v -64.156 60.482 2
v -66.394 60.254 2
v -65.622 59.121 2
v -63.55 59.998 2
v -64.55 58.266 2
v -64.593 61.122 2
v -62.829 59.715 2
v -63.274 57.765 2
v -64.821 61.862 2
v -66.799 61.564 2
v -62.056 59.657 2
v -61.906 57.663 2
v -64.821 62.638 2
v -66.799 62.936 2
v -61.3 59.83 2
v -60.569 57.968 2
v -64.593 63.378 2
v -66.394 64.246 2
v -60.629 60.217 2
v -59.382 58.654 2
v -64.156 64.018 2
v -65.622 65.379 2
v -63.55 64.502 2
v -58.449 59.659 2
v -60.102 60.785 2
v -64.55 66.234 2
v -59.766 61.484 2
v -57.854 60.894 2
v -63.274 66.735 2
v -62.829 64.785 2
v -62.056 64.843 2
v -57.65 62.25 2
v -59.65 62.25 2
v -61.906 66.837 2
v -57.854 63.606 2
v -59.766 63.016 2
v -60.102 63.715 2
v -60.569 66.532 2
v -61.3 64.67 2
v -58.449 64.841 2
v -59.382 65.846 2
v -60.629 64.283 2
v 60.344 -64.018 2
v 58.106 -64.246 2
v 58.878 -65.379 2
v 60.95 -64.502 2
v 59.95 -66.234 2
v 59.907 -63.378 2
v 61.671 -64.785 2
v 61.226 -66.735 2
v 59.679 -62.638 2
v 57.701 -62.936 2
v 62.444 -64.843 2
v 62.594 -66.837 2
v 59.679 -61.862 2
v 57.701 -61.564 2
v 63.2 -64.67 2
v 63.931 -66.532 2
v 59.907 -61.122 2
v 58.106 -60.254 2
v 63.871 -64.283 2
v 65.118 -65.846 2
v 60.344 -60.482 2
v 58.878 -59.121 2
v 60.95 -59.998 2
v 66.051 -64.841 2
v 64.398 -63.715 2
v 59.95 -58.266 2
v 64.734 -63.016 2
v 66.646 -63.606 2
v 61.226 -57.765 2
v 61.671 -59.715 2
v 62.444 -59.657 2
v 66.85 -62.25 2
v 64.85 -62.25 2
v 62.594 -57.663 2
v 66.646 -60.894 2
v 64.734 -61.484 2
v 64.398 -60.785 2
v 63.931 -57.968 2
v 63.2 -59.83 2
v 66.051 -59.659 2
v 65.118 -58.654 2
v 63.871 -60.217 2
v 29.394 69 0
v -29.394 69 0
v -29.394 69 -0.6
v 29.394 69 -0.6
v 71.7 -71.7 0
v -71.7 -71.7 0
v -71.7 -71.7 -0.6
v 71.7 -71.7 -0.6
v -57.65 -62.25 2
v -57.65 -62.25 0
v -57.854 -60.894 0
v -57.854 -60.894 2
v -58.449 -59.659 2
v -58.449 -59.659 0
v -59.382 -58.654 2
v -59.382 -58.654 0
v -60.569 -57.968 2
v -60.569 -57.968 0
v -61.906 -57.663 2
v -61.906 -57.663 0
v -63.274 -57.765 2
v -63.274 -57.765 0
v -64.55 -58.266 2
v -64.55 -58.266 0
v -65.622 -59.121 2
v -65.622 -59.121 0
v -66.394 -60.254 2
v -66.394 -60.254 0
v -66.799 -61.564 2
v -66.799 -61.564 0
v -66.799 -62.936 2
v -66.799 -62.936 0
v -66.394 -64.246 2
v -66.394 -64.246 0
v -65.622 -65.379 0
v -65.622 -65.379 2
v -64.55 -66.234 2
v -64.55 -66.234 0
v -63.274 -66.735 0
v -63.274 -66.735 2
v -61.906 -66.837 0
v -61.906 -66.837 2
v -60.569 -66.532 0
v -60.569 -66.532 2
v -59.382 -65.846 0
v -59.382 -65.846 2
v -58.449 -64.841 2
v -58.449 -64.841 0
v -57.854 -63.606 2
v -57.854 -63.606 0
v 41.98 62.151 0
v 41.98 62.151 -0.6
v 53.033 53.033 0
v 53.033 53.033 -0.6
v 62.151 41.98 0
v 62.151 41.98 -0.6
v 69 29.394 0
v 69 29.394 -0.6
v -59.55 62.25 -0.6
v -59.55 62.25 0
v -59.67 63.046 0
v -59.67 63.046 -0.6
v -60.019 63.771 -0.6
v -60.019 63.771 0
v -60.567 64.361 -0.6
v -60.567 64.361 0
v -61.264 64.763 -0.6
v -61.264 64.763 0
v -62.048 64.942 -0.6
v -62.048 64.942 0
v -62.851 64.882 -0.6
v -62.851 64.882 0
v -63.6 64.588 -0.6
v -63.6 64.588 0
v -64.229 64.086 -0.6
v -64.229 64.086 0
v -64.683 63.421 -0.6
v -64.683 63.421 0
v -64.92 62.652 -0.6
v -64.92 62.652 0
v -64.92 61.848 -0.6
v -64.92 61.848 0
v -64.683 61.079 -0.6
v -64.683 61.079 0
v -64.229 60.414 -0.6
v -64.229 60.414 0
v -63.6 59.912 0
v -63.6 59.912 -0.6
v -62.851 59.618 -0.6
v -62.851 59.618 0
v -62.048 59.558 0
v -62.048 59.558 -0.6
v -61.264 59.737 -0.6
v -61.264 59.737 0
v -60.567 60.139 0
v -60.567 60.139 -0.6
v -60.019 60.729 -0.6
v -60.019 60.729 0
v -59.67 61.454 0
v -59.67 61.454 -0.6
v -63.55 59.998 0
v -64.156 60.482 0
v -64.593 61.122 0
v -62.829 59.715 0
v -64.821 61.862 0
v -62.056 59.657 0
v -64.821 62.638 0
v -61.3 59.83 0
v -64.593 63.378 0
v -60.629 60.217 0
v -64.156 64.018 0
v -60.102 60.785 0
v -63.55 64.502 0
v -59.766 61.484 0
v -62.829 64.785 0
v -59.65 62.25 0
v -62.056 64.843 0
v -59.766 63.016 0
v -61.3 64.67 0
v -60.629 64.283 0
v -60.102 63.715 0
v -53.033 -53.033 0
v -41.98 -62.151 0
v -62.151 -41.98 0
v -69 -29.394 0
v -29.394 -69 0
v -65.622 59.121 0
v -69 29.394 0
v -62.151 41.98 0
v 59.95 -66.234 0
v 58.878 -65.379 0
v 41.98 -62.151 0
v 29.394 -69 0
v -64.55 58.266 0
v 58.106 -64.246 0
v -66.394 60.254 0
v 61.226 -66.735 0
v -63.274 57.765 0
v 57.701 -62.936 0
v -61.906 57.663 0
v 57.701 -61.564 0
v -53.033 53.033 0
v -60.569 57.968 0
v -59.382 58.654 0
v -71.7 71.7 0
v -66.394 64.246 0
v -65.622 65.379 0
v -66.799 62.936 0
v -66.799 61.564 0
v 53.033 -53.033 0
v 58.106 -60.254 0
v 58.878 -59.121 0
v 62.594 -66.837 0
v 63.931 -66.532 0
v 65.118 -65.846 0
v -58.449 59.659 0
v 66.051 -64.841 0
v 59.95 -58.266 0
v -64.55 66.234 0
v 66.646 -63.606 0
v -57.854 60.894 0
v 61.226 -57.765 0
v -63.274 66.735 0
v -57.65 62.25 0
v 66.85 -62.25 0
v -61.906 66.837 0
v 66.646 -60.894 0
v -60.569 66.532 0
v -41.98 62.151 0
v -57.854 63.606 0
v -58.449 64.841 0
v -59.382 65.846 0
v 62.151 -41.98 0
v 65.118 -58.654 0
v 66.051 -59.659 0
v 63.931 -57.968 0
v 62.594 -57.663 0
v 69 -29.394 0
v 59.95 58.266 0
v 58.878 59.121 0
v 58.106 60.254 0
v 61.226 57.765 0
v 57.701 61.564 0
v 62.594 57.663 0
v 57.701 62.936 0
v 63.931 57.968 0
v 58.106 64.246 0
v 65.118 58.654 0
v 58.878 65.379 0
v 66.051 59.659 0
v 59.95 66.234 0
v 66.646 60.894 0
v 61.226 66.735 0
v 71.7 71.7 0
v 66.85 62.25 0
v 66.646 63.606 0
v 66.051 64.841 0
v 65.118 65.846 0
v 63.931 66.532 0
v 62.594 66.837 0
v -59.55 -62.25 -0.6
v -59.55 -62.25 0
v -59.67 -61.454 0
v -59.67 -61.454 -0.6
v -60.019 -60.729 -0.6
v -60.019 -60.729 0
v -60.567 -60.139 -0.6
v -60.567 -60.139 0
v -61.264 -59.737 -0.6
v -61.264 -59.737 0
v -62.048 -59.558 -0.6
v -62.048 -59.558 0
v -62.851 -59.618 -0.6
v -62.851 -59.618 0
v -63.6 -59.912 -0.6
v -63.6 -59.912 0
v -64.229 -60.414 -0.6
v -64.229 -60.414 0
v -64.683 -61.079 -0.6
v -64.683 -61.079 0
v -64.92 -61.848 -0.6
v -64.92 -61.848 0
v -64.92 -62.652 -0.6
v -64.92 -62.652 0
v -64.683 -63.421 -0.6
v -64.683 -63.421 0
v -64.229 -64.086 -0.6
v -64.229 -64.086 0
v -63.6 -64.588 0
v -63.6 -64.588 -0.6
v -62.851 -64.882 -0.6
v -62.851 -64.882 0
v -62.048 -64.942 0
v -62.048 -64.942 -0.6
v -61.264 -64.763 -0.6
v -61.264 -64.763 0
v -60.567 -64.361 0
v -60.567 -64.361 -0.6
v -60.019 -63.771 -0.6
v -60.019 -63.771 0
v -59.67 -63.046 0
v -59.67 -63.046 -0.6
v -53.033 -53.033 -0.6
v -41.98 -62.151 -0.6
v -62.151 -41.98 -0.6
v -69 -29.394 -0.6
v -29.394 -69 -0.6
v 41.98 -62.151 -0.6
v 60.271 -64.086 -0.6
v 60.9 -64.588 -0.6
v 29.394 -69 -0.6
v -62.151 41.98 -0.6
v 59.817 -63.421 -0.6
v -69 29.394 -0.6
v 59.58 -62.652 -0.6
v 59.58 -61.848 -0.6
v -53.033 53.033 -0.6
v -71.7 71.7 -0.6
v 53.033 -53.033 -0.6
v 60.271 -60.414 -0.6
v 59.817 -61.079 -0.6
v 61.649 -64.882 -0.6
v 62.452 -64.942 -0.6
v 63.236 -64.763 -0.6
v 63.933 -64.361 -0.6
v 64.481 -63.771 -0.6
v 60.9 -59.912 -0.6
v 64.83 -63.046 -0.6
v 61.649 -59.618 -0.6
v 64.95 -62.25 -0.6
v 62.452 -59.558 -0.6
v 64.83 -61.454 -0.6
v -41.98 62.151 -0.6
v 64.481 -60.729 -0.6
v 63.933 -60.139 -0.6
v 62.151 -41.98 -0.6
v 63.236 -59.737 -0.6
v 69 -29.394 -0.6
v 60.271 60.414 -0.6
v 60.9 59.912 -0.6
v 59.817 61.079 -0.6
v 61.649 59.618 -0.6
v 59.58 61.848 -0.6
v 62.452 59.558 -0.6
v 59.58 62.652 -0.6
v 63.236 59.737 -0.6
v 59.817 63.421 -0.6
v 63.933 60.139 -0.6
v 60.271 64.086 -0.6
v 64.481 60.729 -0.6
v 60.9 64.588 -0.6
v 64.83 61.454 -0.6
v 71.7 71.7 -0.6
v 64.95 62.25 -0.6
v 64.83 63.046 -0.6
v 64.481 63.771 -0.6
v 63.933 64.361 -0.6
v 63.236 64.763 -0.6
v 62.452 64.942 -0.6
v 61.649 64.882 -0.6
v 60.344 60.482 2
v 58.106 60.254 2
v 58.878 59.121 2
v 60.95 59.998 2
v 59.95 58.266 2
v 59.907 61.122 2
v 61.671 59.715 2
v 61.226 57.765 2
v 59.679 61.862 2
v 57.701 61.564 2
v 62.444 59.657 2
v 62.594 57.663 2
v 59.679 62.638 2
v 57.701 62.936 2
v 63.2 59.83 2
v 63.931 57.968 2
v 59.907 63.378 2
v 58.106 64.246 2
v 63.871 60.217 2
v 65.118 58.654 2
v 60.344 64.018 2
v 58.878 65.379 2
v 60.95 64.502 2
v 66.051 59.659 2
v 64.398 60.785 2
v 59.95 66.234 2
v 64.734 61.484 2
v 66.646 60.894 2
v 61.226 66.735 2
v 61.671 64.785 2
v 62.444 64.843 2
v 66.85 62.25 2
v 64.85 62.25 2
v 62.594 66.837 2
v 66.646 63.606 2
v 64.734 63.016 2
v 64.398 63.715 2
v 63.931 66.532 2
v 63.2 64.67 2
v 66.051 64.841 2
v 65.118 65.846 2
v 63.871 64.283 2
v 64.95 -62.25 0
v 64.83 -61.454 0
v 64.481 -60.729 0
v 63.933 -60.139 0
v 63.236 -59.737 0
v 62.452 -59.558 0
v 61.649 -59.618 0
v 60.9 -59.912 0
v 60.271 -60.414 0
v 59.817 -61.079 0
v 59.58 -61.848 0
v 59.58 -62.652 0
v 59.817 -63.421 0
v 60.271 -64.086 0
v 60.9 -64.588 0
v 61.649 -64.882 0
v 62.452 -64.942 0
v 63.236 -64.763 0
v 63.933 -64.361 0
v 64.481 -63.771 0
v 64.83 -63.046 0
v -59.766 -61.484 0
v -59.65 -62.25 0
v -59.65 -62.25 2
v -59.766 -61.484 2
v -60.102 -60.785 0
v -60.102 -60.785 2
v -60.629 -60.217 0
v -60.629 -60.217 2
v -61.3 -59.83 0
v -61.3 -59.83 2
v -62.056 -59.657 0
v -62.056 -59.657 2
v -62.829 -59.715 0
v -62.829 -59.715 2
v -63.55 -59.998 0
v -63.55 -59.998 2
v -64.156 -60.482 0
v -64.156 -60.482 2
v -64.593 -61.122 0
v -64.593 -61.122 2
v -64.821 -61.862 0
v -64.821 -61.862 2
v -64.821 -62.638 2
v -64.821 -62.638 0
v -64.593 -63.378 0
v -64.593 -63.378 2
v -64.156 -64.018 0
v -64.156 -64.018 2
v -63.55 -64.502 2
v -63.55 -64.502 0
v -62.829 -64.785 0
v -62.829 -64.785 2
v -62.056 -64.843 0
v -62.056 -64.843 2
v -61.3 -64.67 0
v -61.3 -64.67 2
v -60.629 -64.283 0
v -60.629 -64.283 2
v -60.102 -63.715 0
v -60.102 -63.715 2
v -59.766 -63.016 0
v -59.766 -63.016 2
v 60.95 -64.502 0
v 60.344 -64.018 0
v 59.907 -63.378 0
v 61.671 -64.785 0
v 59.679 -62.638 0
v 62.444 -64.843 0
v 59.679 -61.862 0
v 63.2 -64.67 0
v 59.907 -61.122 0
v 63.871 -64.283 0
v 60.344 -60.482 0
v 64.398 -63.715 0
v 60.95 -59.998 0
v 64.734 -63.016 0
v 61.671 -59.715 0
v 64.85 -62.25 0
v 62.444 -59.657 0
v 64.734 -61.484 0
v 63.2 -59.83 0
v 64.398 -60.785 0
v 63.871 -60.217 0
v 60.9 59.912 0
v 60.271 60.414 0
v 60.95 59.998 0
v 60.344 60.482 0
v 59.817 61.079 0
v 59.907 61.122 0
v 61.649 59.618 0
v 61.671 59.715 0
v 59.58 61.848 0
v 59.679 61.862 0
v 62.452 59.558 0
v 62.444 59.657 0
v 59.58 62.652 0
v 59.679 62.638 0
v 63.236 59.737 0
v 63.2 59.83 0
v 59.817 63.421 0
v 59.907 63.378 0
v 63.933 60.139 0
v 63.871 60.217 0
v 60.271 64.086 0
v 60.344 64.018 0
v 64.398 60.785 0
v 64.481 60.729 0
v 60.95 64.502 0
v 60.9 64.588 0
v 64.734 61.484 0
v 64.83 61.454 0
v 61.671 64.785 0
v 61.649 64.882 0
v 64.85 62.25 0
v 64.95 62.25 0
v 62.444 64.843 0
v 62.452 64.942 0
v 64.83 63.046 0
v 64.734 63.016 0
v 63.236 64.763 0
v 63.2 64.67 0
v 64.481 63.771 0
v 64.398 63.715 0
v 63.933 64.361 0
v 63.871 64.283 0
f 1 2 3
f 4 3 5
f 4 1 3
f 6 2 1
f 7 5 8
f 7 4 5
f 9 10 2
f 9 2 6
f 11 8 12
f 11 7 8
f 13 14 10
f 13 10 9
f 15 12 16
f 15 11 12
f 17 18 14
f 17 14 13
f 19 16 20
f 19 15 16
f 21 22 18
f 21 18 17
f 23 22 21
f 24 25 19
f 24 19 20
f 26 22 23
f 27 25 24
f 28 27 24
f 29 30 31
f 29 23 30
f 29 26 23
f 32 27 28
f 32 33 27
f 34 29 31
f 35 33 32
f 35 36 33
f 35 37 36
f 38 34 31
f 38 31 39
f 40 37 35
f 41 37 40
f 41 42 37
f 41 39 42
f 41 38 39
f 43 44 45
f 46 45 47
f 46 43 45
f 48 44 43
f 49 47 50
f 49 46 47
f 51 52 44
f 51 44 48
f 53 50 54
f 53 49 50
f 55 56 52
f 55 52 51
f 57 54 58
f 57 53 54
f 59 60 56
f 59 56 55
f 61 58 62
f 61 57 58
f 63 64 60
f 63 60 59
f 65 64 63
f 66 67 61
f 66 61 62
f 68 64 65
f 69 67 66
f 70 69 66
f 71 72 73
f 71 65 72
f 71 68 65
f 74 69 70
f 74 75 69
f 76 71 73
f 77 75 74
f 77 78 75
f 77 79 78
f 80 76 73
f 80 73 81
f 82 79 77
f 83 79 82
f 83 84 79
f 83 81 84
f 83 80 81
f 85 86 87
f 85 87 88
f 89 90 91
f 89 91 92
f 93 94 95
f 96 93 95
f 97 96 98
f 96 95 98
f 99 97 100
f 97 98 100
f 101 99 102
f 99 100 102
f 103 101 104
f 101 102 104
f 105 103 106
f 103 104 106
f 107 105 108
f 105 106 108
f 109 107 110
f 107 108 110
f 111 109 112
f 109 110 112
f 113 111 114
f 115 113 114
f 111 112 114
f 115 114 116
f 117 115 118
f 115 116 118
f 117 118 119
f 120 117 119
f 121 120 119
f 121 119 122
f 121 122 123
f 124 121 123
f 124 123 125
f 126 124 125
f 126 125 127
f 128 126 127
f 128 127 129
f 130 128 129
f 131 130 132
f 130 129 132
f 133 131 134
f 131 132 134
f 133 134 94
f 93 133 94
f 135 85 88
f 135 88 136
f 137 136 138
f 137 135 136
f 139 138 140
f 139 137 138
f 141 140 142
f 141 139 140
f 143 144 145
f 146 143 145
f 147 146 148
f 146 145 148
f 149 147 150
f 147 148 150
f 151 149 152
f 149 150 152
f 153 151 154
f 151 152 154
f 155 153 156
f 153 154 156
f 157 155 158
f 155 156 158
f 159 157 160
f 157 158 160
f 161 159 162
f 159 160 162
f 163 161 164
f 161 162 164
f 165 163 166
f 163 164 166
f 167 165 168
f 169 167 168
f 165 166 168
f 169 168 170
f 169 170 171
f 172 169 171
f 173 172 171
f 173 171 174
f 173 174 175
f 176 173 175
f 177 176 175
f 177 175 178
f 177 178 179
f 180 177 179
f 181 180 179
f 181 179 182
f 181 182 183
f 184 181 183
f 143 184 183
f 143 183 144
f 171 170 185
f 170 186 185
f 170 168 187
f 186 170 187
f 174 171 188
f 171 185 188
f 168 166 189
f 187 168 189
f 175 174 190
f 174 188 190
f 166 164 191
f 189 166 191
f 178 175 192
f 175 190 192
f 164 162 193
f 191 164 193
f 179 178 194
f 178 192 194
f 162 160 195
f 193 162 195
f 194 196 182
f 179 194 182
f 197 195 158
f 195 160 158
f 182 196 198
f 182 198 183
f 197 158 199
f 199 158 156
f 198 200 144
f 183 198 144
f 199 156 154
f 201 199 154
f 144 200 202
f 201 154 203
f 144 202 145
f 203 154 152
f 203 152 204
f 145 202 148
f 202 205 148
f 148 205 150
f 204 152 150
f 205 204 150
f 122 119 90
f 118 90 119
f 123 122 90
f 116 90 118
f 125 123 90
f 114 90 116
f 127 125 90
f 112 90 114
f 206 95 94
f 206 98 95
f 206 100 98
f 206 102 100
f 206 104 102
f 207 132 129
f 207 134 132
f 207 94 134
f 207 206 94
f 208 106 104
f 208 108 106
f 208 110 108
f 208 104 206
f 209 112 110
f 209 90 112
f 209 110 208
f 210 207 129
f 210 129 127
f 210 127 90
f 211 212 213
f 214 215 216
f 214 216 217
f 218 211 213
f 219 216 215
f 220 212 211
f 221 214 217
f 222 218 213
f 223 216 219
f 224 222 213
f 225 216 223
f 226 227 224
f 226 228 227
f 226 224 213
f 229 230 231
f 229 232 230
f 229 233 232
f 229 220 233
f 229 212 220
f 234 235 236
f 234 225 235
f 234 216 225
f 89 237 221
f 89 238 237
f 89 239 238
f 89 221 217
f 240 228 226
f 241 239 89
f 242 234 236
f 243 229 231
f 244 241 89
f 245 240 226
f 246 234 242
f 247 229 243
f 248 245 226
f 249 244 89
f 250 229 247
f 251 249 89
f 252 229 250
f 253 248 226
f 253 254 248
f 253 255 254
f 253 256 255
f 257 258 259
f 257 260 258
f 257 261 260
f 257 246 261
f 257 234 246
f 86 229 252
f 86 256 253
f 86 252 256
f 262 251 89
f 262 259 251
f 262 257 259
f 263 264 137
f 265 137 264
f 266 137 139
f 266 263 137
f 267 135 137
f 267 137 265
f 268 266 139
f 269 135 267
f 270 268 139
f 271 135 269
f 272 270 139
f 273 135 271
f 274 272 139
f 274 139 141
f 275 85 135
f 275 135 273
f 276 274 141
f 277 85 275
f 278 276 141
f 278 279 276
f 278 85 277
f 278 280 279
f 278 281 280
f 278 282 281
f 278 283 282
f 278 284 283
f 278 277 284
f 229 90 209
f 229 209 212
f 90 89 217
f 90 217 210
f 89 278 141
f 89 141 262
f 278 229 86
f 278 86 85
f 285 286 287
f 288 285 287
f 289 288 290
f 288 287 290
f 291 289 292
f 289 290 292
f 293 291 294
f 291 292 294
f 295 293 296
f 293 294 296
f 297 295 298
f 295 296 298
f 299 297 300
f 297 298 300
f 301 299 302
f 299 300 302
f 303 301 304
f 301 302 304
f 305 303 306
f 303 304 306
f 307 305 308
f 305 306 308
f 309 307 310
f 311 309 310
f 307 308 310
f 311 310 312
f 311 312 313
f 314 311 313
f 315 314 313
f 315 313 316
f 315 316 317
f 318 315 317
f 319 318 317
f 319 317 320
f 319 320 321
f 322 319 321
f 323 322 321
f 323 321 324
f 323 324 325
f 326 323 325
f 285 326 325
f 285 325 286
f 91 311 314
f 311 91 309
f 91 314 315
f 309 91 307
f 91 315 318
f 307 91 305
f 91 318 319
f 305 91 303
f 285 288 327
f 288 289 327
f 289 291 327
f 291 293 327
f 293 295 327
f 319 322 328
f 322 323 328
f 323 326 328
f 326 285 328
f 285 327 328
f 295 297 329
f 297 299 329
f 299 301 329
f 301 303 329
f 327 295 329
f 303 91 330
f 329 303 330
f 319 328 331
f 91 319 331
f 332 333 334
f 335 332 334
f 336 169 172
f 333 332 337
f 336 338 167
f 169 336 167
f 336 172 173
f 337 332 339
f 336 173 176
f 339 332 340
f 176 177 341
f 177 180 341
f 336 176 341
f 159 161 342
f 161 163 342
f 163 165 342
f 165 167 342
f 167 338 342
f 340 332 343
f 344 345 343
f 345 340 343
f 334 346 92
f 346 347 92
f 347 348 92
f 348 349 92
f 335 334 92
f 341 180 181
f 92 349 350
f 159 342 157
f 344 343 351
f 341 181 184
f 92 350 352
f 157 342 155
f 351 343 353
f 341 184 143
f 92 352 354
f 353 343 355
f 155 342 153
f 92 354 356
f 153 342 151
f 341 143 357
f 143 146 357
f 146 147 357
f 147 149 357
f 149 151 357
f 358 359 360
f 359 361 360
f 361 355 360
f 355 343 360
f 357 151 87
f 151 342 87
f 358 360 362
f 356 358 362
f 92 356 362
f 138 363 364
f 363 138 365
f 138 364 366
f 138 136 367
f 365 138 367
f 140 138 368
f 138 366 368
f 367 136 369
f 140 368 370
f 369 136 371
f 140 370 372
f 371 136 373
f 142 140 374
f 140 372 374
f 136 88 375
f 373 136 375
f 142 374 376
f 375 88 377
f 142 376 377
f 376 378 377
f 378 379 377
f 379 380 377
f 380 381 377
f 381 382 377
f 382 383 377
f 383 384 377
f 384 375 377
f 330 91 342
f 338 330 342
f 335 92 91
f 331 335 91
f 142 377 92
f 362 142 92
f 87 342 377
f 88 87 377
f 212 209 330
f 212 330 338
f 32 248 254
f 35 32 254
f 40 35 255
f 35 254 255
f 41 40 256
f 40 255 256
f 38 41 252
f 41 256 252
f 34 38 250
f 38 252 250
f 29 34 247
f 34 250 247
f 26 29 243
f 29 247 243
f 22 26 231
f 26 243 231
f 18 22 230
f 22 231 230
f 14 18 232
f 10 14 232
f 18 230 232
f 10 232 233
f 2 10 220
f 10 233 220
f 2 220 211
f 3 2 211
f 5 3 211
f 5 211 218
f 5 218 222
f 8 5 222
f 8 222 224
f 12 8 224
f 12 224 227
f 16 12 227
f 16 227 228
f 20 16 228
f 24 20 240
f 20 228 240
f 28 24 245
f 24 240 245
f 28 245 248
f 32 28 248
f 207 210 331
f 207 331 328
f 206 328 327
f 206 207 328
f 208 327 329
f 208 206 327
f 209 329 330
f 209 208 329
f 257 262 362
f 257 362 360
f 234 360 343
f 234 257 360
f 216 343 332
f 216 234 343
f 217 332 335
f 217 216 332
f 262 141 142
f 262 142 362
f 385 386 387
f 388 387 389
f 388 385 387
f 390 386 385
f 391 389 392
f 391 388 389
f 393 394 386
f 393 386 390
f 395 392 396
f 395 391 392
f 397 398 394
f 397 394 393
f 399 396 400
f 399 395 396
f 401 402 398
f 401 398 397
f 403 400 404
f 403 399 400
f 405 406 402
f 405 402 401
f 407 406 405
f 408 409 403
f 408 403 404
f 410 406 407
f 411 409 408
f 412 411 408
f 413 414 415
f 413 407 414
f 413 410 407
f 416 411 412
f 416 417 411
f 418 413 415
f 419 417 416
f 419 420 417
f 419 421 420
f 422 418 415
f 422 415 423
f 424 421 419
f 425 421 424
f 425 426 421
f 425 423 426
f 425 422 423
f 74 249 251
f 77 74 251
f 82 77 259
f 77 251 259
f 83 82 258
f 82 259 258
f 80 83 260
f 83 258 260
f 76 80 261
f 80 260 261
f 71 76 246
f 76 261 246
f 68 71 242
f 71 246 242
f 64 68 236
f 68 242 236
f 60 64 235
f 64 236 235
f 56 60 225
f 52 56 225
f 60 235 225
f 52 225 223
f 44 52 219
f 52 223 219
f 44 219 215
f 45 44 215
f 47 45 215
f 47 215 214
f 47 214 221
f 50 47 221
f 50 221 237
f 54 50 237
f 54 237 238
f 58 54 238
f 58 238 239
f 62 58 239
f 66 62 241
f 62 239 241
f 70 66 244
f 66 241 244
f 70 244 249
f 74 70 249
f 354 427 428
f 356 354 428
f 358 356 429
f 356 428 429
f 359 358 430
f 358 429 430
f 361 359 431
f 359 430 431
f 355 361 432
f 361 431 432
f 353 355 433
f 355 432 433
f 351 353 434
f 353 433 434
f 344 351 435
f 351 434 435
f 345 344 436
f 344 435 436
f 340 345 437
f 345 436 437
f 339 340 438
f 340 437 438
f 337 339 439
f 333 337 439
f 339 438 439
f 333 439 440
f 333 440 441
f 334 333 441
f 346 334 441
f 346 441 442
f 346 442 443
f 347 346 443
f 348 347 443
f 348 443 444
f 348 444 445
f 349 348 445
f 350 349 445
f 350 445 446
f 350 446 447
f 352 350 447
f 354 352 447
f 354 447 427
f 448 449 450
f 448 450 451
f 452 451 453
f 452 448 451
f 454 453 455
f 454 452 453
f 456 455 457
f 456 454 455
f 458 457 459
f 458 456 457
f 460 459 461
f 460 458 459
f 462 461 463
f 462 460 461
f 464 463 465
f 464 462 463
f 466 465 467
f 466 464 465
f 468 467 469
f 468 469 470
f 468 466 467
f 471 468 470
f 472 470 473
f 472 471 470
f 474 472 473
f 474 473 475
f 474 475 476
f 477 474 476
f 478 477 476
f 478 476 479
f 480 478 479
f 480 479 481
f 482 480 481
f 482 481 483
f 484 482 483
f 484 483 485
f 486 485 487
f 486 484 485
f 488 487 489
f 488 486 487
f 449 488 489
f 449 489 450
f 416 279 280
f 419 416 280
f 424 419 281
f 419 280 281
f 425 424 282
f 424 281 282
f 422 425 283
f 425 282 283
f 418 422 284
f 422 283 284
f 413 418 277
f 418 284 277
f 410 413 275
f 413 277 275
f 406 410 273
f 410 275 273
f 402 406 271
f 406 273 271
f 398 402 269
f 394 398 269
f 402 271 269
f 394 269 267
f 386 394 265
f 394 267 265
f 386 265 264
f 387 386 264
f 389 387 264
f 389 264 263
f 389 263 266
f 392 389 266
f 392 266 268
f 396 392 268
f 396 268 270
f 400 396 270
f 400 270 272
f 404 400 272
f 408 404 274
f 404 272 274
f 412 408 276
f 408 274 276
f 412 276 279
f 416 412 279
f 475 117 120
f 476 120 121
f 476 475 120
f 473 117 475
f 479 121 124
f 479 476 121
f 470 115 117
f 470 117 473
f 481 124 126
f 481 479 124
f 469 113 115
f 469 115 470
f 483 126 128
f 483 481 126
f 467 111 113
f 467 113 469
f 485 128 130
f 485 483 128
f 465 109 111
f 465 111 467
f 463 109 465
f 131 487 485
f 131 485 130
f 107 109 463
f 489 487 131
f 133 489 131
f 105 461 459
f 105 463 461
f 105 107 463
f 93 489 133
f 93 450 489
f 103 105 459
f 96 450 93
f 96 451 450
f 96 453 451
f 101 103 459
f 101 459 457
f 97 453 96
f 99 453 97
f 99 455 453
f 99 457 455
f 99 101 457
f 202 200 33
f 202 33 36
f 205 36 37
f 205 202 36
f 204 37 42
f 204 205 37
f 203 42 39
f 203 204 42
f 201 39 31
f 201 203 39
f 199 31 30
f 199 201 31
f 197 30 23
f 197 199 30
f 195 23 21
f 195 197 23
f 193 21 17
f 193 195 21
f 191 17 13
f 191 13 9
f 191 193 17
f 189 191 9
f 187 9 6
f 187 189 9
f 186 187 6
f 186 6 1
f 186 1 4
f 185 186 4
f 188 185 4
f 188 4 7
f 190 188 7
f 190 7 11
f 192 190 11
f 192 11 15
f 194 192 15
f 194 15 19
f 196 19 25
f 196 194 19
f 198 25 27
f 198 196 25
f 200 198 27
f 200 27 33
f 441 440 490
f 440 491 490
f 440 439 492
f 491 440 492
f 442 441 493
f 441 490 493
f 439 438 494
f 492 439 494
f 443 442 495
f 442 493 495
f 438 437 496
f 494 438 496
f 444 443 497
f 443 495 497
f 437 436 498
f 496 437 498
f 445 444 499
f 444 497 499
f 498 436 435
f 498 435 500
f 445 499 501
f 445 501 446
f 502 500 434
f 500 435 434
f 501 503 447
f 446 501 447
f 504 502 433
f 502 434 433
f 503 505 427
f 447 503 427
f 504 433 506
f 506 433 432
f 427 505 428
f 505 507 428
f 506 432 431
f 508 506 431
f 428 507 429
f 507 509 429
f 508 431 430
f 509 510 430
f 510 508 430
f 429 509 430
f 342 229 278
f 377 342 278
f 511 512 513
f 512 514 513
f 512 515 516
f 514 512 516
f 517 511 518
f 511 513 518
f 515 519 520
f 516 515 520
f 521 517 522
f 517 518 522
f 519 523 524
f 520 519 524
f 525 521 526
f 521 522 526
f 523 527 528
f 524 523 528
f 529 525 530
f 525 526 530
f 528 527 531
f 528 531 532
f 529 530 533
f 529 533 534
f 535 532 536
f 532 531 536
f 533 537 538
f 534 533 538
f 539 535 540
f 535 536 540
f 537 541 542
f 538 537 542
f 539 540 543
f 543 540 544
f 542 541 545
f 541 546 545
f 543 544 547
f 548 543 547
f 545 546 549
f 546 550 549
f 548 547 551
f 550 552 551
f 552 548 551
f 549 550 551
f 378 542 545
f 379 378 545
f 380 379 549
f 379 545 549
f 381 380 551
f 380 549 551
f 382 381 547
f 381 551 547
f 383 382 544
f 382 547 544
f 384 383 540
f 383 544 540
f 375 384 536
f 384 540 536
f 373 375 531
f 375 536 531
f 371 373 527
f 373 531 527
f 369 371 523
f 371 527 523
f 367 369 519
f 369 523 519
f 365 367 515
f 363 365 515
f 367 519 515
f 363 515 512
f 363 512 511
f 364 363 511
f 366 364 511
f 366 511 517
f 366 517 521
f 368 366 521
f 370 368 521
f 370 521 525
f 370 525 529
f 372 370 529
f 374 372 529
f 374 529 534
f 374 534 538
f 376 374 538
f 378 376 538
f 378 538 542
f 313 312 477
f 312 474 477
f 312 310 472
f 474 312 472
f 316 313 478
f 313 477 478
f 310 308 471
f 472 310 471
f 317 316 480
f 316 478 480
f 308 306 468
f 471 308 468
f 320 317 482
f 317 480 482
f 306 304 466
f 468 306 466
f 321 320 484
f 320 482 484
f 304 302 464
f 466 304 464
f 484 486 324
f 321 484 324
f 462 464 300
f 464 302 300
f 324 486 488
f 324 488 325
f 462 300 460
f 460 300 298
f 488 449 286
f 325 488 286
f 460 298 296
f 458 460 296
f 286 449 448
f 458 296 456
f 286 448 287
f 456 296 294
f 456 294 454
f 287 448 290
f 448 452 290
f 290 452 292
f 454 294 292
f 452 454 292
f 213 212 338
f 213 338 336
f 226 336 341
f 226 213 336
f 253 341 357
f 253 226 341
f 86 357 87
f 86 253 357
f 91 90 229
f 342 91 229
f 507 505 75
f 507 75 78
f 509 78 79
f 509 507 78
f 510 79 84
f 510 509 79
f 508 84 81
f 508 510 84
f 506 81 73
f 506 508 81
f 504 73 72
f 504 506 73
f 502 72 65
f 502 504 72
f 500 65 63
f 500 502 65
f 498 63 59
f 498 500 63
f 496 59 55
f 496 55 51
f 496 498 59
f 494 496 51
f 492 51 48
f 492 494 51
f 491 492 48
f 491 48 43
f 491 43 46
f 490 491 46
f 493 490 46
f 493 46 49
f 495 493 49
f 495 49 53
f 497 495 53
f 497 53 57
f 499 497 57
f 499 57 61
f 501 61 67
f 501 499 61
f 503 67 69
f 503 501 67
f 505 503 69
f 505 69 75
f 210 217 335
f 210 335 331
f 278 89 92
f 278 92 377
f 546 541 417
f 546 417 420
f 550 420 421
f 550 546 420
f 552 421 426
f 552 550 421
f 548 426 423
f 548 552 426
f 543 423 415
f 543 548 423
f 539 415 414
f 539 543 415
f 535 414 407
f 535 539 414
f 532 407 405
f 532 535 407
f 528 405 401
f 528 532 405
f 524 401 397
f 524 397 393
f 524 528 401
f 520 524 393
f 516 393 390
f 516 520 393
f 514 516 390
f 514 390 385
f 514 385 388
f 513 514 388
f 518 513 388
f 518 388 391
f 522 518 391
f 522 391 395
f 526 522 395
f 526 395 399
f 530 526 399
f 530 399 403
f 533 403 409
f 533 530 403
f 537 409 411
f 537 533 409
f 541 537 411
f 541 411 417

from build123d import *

# Parameters (mm, degrees)
F1_W     = 143.4
F1_H     = 143.4
F3_DEPTH = 0.6
F2_R     = 2.7
F4_DEPTH = 0.601
F5_R     = 4.6
F5_R_2   = 2.6
F6_DEPTH = 2


with BuildPart() as f3:
    # F1 (on Top) → F3 (new body)
    with BuildSketch(Plane.XY):
        Rectangle(F1_W, F1_H)
        with BuildLine():
            ThreePointArc((-69, 29.393877), (-53.033009, 53.033009), (-29.393877, 69))
            Line((-29.393877, 69), (29.393877, 69))
            ThreePointArc((29.393877, 69), (53.033009, 53.033009), (69, 29.393877))
            Line((69, 29.393877), (69, -29.393877))
            ThreePointArc((69, -29.393877), (53.033009, -53.033009), (29.393877, -69))
            Line((29.393877, -69), (-29.393877, -69))
            ThreePointArc((-29.393877, -69), (-53.033009, -53.033009), (-69, -29.393877))
            Line((-69, -29.393877), (-69, 29.393877))
        make_face(mode=Mode.SUBTRACT)
    extrude(amount=-F3_DEPTH)

    # F2 (on Top) → F4 (cut, through all)
    with BuildSketch(Plane.XY):
        with Locations((62.25, 62.25)):
            Circle(F2_R)
        with Locations((-62.25, 62.25)):
            Circle(F2_R)
        with Locations((-62.25, -62.25)):
            Circle(F2_R)
        with Locations((62.25, -62.25)):
            Circle(F2_R)
    extrude(amount=-F4_DEPTH, mode=Mode.SUBTRACT)

    # F5 (on Top) → F6 (join)
    with BuildSketch(Plane.XY):
        with Locations((-62.25, 62.25)):
            Circle(F5_R)
        with Locations((-62.25, 62.25)):
            Circle(F5_R_2, mode=Mode.SUBTRACT)
        with Locations((-62.25, -62.25)):
            Circle(F5_R)
        with Locations((-62.25, -62.25)):
            Circle(F5_R_2, mode=Mode.SUBTRACT)
        with Locations((62.25, -62.25)):
            Circle(F5_R)
        with Locations((62.25, -62.25)):
            Circle(F5_R_2, mode=Mode.SUBTRACT)
        with Locations((62.25, 62.25)):
            Circle(F5_R)
        with Locations((62.25, 62.25)):
            Circle(F5_R_2, mode=Mode.SUBTRACT)
    extrude(amount=F6_DEPTH)


solid = f3.part
